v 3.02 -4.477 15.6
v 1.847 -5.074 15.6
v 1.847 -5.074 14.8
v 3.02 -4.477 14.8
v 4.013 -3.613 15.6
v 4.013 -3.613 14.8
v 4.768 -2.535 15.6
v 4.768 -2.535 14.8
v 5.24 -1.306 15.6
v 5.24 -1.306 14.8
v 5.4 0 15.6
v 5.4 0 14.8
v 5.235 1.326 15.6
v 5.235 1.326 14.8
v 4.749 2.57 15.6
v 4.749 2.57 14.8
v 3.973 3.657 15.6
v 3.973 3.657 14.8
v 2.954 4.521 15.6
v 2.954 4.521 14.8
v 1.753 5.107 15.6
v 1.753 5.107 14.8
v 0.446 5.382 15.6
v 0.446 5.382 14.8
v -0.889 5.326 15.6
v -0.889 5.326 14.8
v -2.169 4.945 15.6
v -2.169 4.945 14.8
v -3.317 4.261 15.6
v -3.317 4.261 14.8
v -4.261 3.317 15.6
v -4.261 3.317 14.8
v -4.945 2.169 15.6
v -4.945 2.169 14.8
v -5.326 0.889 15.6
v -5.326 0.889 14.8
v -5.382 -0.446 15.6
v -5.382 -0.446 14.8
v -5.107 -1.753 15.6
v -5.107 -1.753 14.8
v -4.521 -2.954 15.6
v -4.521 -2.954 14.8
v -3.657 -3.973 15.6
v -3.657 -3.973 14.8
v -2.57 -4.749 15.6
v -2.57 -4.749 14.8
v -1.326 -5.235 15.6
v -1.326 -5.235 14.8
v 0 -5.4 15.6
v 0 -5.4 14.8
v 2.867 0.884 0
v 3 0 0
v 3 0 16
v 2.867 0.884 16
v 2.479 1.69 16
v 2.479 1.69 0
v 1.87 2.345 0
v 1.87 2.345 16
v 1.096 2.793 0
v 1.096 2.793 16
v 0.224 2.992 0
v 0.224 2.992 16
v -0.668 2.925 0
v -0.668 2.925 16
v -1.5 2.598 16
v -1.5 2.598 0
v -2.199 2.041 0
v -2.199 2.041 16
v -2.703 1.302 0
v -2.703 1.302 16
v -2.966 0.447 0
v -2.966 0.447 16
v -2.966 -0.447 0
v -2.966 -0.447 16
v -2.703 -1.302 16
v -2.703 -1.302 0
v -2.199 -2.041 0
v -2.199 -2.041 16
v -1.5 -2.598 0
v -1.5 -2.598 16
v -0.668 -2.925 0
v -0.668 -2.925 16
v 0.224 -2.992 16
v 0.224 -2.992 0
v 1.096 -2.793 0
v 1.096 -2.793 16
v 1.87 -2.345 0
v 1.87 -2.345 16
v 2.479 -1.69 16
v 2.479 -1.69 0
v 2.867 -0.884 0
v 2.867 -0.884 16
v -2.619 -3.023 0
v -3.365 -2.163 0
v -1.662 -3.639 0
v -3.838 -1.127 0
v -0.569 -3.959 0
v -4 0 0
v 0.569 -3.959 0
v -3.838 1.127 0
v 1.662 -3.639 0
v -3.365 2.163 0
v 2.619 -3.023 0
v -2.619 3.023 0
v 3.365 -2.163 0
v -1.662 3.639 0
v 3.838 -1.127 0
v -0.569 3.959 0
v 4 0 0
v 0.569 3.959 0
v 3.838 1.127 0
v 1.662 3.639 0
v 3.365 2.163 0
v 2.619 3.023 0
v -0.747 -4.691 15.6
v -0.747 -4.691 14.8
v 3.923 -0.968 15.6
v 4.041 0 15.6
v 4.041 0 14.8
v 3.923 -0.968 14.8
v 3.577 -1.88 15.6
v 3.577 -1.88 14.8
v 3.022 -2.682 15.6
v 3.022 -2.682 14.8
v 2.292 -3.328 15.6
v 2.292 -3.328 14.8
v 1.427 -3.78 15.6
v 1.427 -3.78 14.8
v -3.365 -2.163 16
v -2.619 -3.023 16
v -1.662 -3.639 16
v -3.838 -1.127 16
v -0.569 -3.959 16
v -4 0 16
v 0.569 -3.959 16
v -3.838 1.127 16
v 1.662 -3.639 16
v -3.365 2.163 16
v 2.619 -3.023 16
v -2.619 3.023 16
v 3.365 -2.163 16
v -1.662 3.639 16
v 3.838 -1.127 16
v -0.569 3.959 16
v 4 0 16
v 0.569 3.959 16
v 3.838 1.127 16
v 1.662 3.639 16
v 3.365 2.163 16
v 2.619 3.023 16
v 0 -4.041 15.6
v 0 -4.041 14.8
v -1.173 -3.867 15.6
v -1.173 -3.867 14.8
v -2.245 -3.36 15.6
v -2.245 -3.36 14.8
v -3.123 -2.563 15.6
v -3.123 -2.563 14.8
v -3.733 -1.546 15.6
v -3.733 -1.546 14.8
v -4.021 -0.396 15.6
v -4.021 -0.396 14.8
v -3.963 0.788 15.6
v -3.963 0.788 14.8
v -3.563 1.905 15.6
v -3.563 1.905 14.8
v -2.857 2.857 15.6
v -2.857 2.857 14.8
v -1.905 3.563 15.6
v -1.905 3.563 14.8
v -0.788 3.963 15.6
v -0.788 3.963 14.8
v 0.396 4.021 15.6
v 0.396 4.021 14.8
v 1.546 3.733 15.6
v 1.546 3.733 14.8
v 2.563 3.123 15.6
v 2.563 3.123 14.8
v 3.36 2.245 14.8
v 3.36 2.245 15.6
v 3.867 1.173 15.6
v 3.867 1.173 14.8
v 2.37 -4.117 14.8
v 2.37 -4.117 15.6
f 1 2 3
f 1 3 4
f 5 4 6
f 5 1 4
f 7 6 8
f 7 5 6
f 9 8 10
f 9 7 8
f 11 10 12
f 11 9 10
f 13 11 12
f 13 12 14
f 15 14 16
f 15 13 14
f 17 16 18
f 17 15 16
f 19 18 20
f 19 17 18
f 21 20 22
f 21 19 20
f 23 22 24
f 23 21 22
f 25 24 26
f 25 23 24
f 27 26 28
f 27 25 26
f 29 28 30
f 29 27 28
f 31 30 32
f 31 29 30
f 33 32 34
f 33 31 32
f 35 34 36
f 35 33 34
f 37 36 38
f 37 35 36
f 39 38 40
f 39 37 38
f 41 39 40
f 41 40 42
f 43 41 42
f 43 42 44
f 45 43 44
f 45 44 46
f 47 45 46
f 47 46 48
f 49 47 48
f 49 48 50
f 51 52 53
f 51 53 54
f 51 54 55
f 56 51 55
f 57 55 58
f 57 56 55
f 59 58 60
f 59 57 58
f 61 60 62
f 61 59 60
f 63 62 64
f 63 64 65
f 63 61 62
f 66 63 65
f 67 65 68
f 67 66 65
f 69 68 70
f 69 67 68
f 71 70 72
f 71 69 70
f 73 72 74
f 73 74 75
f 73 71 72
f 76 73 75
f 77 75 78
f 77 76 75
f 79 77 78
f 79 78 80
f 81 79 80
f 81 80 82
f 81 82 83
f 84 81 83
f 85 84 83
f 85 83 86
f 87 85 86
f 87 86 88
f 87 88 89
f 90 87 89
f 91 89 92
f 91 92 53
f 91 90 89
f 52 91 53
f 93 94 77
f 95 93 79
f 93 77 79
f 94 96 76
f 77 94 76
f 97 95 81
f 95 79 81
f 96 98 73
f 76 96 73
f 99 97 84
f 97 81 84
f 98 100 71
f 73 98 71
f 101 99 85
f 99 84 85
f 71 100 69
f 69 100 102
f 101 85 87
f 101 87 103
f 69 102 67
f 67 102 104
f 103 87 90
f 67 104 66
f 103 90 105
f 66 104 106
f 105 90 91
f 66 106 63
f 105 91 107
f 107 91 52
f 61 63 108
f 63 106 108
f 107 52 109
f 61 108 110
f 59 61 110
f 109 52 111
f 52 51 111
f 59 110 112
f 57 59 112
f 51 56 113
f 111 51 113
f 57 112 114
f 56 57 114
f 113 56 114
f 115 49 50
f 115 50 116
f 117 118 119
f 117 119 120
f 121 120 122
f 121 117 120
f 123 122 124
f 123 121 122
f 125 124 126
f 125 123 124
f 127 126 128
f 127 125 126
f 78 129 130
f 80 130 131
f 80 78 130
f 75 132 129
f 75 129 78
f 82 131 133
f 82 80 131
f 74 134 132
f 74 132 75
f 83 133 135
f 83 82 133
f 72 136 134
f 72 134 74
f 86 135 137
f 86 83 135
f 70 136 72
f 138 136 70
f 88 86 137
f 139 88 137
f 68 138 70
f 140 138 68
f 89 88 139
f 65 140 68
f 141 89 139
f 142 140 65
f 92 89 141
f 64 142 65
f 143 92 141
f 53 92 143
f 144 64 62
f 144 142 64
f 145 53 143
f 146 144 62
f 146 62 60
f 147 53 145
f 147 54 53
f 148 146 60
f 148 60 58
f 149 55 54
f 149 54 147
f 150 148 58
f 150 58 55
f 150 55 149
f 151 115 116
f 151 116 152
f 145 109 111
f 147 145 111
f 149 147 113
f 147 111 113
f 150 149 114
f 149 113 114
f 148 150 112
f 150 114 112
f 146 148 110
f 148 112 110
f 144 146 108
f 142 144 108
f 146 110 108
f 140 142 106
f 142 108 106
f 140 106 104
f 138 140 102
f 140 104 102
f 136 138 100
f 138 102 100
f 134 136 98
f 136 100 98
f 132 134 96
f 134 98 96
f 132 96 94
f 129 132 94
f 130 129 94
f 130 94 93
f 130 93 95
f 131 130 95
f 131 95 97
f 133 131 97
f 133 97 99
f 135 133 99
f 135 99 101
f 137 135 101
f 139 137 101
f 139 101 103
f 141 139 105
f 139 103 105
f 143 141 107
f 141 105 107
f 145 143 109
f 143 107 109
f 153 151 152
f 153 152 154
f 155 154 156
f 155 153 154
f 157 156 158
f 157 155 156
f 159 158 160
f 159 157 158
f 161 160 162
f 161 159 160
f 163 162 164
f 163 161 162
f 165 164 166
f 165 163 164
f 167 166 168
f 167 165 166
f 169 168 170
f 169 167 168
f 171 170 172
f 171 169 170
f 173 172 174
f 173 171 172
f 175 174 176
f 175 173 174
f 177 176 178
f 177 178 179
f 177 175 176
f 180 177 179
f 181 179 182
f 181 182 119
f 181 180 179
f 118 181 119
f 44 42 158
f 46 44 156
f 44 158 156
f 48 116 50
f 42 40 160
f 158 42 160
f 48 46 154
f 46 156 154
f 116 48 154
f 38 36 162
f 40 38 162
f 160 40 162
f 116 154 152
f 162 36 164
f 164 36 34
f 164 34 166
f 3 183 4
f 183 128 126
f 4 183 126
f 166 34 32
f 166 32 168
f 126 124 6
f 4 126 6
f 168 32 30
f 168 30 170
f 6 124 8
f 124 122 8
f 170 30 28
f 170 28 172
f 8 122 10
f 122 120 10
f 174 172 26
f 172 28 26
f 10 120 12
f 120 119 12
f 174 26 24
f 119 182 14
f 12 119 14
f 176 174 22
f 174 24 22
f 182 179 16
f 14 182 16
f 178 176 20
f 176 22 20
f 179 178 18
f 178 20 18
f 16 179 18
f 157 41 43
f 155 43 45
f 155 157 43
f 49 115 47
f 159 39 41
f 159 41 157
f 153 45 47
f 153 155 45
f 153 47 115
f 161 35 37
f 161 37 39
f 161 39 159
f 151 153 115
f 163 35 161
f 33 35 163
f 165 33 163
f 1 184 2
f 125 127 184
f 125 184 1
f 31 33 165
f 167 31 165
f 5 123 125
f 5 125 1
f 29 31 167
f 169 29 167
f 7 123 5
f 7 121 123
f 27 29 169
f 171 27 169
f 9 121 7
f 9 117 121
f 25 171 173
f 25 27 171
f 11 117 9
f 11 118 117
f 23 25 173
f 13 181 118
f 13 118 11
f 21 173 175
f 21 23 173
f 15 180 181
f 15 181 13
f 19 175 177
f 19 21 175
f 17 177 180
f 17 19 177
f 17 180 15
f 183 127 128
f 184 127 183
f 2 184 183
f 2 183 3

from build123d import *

# Parameters (mm, degrees)
SKETCH_1_R      = 4
SKETCH_1_R_2    = 3
EXTRUDE_1_DEPTH = 16
EXTRUDE_START   = -0.4
EXTRUDE_2_DEPTH = 0.8


with BuildPart() as part:
    # 草图1 → 凸台-拉伸1 (new body)
    with BuildSketch(Plane.XY):
        Circle(SKETCH_1_R)
        Circle(SKETCH_1_R_2, mode=Mode.SUBTRACT)
    extrude(amount=EXTRUDE_1_DEPTH)


with BuildPart() as body_2:
    # 草图2 → 凸台-拉伸2 (new body)
    with BuildSketch(Plane.XY.offset(16).offset(EXTRUDE_START)):
        with BuildLine():
            Line((0, -5.4), (-0.747466557, -4.690820157))
            ThreePointArc((-0.747466557, -4.690820157), (-3.083182922, 3.613375579), (4.75, 0))
            ThreePointArc((4.75, 0), (4.112111247, -2.377612477), (2.369772172, -4.11663453))
            Line((2.369772172, -4.11663453), (1.846908774, -5.074340152))
            ThreePointArc((1.846908774, -5.074340152), (4.423421039, -3.097312756), (5.4, 0))
            ThreePointArc((5.4, 0), (-3.818376618, 3.818376618), (0, -5.4))
        make_face()
        with BuildLine():
            Line((-0.747466557, -4.690820157), (0, -4.040519826))
            ThreePointArc((0, -4.040519826), (-2.857078969, 2.857078969), (4.040519826, 0))
            ThreePointArc((4.040519826, 0), (3.323656961, -2.297630273), (1.427437799, -3.779976428))
            Line((1.427437799, -3.779976428), (2.369772172, -4.11663453))
            ThreePointArc((2.369772172, -4.11663453), (4.112111247, -2.377612477), (4.75, 0))
            ThreePointArc((4.75, 0), (-3.083182922, 3.613375579), (-0.747466557, -4.690820157))
        make_face()
    extrude(amount=-EXTRUDE_2_DEPTH)


solid = Compound([part.part, body_2.part])
